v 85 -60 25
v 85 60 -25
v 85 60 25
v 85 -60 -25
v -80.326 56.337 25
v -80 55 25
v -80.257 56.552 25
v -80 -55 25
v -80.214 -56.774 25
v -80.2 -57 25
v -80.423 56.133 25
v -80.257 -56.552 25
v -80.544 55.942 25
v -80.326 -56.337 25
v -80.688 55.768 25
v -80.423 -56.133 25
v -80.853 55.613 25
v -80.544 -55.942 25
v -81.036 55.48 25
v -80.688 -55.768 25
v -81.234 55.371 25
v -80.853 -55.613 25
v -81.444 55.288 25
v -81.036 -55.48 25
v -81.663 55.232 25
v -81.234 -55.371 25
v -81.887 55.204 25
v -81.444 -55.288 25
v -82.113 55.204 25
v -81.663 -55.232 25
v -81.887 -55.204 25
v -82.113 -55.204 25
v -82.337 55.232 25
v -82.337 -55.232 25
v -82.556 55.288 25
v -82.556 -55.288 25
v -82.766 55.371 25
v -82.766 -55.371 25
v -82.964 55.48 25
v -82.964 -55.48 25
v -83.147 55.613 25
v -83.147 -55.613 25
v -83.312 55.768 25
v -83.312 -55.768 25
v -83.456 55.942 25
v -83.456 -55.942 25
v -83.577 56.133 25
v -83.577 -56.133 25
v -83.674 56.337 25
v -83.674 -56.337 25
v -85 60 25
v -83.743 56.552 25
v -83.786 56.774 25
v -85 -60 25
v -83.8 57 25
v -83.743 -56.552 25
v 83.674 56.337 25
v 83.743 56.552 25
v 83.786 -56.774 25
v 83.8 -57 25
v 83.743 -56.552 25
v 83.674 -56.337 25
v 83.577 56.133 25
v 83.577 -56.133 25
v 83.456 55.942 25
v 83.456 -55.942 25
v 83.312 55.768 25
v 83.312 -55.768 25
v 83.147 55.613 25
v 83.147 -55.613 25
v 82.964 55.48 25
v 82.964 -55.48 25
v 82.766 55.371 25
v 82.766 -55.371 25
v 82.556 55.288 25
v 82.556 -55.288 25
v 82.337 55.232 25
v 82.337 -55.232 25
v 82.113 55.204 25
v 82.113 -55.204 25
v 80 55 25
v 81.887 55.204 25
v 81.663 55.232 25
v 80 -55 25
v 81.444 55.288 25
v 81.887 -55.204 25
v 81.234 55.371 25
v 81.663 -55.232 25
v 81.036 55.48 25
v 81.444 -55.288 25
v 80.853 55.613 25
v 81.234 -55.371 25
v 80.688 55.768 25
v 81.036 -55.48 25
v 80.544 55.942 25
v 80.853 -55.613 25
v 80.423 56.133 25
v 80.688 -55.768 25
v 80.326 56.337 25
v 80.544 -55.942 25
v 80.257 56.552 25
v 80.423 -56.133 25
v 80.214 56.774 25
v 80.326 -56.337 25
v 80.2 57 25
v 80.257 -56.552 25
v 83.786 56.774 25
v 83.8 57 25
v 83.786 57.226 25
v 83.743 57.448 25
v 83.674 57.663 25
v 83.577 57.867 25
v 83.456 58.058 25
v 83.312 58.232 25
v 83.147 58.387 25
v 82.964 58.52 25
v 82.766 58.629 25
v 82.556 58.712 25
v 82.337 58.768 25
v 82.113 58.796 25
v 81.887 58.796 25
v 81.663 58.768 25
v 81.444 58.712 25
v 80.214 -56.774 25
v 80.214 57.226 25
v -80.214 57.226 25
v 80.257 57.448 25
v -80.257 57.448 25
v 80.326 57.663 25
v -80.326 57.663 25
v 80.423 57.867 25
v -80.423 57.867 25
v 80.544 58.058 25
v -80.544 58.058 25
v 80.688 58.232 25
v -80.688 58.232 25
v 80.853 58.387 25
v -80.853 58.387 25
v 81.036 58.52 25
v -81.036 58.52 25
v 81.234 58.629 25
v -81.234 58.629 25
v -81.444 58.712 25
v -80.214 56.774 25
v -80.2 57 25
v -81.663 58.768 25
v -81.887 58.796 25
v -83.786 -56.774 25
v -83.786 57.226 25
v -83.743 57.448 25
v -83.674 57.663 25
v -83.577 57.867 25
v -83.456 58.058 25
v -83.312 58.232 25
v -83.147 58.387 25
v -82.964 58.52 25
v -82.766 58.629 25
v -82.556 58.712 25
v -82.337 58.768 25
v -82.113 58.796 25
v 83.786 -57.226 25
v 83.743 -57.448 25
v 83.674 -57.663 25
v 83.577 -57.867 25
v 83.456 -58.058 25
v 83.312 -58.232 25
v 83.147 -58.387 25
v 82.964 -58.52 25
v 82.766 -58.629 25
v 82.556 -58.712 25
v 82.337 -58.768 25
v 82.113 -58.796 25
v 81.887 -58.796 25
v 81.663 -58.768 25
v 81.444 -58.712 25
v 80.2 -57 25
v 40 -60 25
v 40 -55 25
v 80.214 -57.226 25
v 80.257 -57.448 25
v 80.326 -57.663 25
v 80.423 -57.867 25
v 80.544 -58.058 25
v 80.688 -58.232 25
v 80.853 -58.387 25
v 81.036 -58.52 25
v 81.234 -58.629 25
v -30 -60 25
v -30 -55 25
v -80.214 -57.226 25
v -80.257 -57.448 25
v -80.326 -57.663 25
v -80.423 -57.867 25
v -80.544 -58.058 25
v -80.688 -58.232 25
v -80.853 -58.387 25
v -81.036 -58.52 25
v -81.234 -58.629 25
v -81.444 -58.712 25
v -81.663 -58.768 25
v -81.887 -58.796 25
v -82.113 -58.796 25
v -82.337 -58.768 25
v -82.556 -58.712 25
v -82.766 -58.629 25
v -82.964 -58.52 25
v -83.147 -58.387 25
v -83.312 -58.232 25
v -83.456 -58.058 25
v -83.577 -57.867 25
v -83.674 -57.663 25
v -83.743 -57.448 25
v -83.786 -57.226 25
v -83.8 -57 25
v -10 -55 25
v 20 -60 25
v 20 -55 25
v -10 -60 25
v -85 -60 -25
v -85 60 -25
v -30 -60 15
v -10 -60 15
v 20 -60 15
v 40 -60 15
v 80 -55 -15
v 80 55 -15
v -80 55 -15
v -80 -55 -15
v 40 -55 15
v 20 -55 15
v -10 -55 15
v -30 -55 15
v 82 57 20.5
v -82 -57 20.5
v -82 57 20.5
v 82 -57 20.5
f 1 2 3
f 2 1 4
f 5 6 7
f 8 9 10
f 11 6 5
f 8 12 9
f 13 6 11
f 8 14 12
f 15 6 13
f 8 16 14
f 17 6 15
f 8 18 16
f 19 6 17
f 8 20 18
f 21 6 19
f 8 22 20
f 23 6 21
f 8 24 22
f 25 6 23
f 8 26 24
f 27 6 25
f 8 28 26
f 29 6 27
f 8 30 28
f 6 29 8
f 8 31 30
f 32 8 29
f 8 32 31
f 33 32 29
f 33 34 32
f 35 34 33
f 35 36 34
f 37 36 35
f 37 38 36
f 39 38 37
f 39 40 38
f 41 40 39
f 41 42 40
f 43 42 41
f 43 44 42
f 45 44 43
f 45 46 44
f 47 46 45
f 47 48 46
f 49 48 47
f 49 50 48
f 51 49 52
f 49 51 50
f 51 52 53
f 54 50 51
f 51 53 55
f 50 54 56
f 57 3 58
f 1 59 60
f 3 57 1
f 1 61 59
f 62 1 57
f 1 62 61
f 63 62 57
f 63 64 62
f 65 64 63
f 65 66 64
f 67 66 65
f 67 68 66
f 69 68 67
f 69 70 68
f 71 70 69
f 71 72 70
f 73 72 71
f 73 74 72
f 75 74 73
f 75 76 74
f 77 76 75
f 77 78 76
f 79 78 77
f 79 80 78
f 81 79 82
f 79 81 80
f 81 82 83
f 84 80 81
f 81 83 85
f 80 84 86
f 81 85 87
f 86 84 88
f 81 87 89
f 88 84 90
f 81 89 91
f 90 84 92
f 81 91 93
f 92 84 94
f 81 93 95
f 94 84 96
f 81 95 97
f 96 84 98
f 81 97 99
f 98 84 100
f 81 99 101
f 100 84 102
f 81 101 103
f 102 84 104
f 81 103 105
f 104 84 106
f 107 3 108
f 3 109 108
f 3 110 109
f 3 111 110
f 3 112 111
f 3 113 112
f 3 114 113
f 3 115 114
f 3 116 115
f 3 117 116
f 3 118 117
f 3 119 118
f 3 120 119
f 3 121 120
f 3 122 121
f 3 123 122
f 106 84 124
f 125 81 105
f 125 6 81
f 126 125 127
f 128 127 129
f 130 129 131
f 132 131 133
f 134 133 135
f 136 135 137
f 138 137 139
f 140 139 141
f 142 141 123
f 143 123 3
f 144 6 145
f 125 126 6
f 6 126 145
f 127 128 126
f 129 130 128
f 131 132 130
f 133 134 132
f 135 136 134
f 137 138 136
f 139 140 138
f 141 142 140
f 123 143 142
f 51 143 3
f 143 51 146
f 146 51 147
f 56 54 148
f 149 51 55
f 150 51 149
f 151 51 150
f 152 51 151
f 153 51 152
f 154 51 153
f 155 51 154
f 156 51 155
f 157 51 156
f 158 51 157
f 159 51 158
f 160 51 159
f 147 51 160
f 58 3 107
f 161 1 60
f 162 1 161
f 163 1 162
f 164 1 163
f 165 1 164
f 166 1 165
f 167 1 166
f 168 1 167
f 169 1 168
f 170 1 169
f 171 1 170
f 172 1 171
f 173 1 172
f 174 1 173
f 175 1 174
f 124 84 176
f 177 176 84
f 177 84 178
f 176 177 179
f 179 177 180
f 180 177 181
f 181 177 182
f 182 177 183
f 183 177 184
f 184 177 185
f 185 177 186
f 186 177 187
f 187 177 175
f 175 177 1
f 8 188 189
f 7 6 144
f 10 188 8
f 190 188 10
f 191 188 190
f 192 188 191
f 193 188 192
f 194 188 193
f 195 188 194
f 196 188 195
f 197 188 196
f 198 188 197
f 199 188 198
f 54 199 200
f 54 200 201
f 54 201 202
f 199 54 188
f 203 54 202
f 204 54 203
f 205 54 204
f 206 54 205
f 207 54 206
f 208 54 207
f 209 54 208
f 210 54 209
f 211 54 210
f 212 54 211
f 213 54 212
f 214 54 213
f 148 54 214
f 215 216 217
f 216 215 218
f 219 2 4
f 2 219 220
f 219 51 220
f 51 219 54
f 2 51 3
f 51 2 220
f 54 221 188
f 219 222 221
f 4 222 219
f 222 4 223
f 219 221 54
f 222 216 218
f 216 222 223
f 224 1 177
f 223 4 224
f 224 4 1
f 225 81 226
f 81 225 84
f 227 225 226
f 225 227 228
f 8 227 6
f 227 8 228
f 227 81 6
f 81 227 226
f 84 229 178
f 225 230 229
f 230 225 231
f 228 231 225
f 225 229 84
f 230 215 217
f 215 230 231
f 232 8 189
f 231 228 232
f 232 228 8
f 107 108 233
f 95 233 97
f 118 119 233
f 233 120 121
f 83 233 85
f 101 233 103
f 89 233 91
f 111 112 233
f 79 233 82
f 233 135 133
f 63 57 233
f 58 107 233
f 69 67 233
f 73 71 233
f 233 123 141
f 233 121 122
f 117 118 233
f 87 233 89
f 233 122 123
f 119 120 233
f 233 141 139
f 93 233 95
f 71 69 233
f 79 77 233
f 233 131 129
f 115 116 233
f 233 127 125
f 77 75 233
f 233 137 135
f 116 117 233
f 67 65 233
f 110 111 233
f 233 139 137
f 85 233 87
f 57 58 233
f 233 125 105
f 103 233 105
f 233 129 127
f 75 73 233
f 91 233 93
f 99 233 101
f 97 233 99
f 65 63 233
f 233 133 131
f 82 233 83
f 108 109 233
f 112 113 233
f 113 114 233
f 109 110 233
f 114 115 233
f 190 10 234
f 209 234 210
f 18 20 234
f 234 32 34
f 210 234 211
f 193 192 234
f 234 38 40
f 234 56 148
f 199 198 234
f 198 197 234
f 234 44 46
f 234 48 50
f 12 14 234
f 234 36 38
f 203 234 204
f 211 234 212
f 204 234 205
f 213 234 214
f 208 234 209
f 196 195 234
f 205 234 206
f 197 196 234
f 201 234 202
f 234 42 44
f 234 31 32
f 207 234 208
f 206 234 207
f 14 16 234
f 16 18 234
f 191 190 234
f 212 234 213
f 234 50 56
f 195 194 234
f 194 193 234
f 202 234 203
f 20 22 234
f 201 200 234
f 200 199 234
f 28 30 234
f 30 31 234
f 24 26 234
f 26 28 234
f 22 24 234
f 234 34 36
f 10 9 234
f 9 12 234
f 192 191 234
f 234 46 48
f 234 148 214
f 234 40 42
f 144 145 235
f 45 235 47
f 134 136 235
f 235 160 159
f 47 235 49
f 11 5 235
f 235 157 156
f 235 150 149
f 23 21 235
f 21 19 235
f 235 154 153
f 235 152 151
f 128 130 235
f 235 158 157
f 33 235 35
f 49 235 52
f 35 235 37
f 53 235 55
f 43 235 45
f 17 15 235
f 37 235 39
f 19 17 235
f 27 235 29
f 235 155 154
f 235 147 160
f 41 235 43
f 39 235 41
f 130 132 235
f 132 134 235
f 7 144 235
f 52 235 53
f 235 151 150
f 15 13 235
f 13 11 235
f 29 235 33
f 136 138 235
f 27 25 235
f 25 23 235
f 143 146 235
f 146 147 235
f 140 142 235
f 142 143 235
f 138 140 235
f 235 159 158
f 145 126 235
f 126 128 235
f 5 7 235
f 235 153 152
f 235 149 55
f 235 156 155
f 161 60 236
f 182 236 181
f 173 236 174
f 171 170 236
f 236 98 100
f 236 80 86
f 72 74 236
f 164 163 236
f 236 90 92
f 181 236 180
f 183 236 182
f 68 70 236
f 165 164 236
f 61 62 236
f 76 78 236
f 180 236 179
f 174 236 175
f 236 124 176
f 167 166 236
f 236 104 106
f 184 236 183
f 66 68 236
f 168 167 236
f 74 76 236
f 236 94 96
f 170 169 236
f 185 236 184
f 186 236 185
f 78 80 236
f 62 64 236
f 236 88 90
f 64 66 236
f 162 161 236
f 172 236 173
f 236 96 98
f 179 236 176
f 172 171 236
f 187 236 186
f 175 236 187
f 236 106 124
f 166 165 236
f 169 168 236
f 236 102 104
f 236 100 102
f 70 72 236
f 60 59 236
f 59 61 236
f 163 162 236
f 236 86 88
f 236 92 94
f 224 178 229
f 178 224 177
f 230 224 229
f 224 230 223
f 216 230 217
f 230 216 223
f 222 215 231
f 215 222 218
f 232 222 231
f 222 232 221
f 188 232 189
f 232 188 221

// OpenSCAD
width = 170;//+40
height = 50;
length = 120;//+20

border_thick = 10;

widht_pad = 30;
height_pad = 20;
lenght_pad = 80;

micro_usb_width= 20;
micro_usb_length= 20;
micro_usb_height= 20;

position_micro_usb_x = 20;
position_micro_usb_y =-length/2-micro_usb_width/2;
position_micro_usb_z = height/2-micro_usb_height/2;

switch_width= 20;
switch_length= 20;
switch_height= 20;

switch_offset = -30;
position_switch_x = switch_offset;
position_switch_y = -length/2-micro_usb_width/2;
position_switch_z = height/2-micro_usb_height/2;

battery_width= 40;
battery_length= 40;
battery_height= 20;

position_battery_x = width/2-battery_width/2;
position_battery_y = length/2-battery_length/2;
position_battery_z = 0;

PCB_width= 110;
PCB_length= 80;
PCB_height= 20;

position_PCB_x = position_battery_x-battery_width-22;
position_PCB_y = length/2-PCB_length/2;
position_PCB_z = 0;



module screws()
{
    
 translate([width/2-3, length/2-3, border_thick+13])
 rotate([180,0,0])   
 cylinder(h=5, r1=2, r2=0, $fn=50,center=true);
    
 translate([-width/2+3, -length/2+3, border_thick+13])
 rotate([180,0,0])   
 cylinder(h=5, r1=2, r2=0,$fn=50, center=true);
    
    translate([-width/2+3, length/2-3, border_thick+13])
 rotate([180,0,0])   
 cylinder(h=5, r1=2, r2=0, $fn=50,center=true);
    
    translate([width/2-3, -length/2+3, border_thick+13])
 rotate([180,0,0])   
 cylinder(h=5, r1=2, r2=0, $fn=50, center=true);
}


module mid()
{
    difference()
    {
        cube([width,length,height],true);
        translate([0,0,border_thick])
        cube([width-border_thick,length-border_thick,height],true);
    }
}

module pad(mirror)
{   
    if(mirror)
    {   
        mirror()
        translate([width/2,-(length/2),-(height/2)])
        hull()
        {
            translate([2000,000,2000])
            sphere(2000);
      
            cube([widht_pad,lenght_pad,height_pad],false);
            translate([1500,14000,1000])
            sphere(400);
        }
    }else
    {
        translate([width/2,-(length/2),-(height/2)])
        hull()
        {
            translate([2000,000,2000])
            sphere(2000);
            cube([widht_pad,lenght_pad,height_pad],false);
            translate([1500,14000,1000])
            sphere(400);
        }
    }
    
}
module battery ()
{
    translate([position_battery_x,position_battery_y,position_battery_z])
    difference()
    {
        cube([battery_width,battery_length,battery_height],true);
        translate([0,0,border_thick])
        cube([battery_width-border_thick,battery_length-border_thick,battery_height],true);
    }
    
}

module PCB()
{
  
     translate([position_PCB_x,position_PCB_y,position_PCB_z])
    difference()
    {
        cube([PCB_width,PCB_length,PCB_height],true);
        translate([0,0,border_thick])
        cube([PCB_width-border_thick,PCB_length-border_thick,PCB_height],true);
    }
}
module micro_usb()
{
 
    translate([position_micro_usb_x,position_micro_usb_y,position_micro_usb_z])
    cube([micro_usb_width,micro_usb_length,micro_usb_height]);
}

module switch()
{
 
    translate([position_switch_x,position_switch_y,position_switch_z])
    cube([switch_width,micro_usb_length,switch_height]);
}

module full_model()
{
    difference()
    {
        union()
        {
            mid();
            //battery();
            //PCB();
           // micro_usb();
            
        }
        micro_usb();
        switch();
        screws();
    //pad(true);
    //pad(false);
    }
    
}
full_model();
